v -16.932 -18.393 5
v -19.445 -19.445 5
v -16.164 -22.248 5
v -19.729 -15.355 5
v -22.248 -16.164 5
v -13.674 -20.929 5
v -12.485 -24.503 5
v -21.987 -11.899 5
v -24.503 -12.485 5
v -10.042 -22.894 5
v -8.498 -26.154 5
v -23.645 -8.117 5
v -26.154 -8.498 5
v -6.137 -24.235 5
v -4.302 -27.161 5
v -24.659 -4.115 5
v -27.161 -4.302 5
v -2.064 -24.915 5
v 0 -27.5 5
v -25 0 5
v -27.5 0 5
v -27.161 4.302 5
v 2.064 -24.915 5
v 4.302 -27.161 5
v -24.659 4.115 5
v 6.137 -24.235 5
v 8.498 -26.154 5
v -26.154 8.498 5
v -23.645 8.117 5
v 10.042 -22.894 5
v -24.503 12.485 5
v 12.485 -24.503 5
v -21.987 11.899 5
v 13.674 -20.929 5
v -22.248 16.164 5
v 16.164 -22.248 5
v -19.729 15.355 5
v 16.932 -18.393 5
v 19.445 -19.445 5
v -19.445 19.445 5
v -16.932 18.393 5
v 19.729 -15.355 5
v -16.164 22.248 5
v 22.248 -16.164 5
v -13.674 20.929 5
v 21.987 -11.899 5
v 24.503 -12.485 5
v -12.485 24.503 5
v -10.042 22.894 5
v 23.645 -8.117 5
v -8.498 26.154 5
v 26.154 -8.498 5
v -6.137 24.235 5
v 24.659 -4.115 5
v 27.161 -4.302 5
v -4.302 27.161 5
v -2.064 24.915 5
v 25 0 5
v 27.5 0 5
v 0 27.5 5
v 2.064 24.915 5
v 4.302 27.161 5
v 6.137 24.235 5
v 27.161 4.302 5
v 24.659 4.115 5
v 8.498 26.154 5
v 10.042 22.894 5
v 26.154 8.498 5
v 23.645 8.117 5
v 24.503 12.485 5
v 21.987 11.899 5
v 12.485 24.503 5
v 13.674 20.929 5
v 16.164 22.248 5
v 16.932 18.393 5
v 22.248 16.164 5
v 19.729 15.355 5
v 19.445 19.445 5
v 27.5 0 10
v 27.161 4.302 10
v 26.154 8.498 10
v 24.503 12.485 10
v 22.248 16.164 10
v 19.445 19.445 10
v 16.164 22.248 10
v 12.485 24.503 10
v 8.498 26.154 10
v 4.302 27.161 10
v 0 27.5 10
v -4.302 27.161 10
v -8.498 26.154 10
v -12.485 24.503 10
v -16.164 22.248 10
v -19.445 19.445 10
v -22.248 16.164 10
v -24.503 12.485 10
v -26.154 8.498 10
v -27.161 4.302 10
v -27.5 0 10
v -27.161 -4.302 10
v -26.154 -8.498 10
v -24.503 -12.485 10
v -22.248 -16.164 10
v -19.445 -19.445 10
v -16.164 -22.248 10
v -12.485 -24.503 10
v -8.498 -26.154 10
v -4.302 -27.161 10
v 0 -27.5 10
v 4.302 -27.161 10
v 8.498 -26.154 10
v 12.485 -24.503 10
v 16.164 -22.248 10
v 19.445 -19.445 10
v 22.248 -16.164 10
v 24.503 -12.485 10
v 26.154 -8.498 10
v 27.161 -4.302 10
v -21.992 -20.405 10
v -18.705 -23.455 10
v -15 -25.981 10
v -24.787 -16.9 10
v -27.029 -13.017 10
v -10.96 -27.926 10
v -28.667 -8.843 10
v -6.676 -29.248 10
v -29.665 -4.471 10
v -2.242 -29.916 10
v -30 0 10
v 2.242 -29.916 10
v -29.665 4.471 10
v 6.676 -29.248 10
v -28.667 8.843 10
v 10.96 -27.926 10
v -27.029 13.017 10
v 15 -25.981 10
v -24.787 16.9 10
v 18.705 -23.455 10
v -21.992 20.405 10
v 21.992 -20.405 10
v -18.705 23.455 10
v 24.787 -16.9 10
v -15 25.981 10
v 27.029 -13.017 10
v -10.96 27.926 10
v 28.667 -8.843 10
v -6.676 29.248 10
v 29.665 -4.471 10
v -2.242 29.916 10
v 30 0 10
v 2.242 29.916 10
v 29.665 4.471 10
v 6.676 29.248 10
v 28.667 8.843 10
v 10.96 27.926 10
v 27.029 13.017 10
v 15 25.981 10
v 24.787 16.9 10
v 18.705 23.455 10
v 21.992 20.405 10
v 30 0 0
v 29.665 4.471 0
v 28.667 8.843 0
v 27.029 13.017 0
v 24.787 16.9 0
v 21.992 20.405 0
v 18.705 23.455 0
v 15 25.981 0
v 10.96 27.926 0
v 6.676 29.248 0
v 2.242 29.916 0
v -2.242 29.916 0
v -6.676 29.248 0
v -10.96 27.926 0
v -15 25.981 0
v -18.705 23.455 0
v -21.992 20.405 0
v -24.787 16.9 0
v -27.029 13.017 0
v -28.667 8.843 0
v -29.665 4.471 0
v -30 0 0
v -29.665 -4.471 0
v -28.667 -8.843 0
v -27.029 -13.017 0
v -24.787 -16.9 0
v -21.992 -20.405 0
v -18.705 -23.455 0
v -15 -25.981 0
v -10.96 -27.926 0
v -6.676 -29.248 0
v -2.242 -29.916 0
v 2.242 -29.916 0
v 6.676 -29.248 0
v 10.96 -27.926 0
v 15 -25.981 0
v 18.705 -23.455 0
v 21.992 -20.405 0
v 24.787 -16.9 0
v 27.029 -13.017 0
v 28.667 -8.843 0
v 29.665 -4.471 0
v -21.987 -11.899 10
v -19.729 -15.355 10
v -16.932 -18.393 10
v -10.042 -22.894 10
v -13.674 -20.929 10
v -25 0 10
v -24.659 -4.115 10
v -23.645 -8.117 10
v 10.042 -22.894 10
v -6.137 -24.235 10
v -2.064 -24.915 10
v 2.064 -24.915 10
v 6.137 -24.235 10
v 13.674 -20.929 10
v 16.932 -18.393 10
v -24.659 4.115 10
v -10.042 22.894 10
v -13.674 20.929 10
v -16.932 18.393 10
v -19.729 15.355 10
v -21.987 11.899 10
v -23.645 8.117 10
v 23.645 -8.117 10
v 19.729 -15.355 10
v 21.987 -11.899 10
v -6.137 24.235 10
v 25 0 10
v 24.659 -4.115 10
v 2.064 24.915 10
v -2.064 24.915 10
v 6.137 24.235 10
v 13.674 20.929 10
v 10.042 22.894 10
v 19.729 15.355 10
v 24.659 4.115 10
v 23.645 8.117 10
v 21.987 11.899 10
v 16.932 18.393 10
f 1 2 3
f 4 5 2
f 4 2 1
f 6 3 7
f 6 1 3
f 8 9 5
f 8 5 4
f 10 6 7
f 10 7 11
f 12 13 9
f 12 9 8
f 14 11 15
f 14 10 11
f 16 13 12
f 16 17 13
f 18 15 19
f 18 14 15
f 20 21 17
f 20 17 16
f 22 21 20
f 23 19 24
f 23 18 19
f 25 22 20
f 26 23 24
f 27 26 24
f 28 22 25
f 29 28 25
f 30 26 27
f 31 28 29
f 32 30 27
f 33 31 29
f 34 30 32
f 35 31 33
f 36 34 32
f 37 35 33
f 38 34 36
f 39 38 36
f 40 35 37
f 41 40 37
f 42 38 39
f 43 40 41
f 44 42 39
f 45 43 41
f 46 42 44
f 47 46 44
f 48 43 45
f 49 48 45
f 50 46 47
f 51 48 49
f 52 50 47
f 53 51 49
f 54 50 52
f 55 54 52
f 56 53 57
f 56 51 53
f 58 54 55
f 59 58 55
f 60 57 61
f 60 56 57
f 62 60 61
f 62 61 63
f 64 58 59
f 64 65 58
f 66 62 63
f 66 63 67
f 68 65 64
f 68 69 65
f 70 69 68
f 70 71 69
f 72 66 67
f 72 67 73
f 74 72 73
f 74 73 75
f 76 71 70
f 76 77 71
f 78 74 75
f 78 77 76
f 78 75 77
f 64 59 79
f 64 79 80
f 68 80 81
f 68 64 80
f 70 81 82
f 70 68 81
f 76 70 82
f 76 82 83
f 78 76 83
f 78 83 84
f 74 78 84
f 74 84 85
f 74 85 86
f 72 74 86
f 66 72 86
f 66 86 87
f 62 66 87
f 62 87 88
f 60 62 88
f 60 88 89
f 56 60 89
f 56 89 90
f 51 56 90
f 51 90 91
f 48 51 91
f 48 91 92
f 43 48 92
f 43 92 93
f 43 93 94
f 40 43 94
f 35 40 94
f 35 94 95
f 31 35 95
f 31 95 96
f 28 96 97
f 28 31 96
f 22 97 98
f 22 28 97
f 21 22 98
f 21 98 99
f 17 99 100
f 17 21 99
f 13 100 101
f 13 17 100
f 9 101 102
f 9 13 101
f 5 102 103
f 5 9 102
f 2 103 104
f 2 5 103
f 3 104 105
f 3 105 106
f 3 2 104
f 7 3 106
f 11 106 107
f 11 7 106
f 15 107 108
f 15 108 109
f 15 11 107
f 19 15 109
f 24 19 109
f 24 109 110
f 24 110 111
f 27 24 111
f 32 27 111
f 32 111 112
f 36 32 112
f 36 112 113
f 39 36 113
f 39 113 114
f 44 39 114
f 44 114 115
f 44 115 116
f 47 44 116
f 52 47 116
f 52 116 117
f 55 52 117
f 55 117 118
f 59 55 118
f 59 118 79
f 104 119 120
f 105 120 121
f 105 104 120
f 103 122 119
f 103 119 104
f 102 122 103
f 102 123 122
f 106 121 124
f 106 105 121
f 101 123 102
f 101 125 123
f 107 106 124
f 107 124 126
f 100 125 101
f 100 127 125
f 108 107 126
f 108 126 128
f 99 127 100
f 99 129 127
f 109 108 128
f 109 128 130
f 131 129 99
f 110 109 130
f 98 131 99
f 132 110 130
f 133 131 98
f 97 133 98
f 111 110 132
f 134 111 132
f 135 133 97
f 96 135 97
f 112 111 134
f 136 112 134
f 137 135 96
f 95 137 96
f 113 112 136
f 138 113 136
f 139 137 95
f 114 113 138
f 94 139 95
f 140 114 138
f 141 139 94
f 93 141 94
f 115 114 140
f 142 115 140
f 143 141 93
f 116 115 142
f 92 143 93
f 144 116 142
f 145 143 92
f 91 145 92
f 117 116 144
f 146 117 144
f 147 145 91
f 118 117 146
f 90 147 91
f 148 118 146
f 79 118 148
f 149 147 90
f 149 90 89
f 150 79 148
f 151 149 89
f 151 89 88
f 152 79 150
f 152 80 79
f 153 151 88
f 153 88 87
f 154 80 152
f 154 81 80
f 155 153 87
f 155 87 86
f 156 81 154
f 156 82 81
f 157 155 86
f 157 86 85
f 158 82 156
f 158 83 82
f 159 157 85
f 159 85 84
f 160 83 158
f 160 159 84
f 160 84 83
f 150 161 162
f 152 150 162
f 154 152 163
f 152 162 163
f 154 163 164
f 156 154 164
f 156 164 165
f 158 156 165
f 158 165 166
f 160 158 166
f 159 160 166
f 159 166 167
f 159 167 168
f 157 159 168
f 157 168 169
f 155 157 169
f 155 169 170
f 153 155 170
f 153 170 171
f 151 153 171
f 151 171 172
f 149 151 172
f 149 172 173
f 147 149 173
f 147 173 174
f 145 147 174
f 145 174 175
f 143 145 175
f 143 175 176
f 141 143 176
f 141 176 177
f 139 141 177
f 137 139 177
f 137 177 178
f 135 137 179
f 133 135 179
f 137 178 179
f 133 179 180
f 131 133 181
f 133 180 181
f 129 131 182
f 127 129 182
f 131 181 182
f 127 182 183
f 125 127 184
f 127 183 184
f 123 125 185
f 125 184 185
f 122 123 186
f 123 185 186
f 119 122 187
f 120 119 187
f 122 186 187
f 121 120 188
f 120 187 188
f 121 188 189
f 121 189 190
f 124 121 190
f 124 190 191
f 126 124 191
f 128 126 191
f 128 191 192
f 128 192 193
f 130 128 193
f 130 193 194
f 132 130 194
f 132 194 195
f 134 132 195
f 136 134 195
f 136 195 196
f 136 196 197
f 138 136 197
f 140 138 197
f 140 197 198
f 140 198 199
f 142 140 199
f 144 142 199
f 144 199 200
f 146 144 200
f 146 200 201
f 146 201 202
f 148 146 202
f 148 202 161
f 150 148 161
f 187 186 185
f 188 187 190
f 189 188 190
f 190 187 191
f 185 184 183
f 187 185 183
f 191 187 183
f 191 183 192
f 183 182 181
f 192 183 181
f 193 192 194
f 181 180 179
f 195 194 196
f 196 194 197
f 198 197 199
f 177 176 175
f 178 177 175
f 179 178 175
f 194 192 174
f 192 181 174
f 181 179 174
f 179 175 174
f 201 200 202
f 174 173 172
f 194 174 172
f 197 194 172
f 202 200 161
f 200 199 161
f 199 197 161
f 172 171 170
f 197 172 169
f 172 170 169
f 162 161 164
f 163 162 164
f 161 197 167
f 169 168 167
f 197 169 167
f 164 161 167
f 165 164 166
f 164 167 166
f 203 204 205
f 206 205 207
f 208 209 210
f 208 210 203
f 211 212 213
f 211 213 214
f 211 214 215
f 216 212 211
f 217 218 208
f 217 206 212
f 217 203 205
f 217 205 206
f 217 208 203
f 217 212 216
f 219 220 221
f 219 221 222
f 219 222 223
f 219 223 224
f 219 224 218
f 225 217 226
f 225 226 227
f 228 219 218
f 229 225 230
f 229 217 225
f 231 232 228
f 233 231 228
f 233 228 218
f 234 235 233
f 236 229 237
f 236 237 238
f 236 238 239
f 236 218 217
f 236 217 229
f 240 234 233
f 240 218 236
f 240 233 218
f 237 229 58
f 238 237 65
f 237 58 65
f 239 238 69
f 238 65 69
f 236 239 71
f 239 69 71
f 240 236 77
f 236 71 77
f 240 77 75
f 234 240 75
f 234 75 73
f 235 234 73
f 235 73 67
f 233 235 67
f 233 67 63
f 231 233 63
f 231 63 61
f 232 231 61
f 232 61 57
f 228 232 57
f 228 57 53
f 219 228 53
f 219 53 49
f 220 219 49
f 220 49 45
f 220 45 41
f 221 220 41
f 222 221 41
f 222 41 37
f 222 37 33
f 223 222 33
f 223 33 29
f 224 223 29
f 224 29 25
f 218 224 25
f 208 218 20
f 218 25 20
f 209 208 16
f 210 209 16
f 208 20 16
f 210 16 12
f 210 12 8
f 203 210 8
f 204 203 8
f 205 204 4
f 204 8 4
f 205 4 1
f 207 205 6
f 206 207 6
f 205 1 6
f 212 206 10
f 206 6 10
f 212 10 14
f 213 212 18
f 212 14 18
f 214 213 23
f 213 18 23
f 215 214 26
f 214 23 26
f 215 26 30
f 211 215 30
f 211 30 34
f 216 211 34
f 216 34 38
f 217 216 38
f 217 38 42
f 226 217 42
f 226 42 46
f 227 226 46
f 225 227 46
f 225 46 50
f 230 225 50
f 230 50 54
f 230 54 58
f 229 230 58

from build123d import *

# Parameters (mm, degrees)
F0_R      = 30
F0_R_2    = 27.5
F1_DEPTH  = 5
F2_DEPTH  = 10
F3_DEPTH  = 7.5
F4_R      = 30
F5_DEPTH  = 5
F6_R      = 30
F6_R_2    = 27.5
F7_DEPTH  = 2.5
F8_R      = 17.5
F9_DEPTH  = 3
F10_R     = 25
F11_DEPTH = 10


# Not quite as in the source:
# - a feature names something its author has since deleted; it is built from what else it names


with BuildPart() as f1:
    # F0 (on Top) → F1 (new body)
    with BuildSketch(Plane.XY):
        Circle(F0_R)
        Circle(F0_R_2, mode=Mode.SUBTRACT)
    extrude(amount=F1_DEPTH)

    # F0 (on Top) → F2 (join)
    with BuildSketch(Plane.XY):
        Circle(F0_R)
        Circle(F0_R_2, mode=Mode.SUBTRACT)
    extrude(amount=F2_DEPTH)

    # F0 (on Top) → F3 (join)
    with BuildSketch(Plane.XY):
        Circle(F0_R)
        Circle(F0_R_2, mode=Mode.SUBTRACT)
    extrude(amount=F3_DEPTH)

    # F4 (on Top) → F5 (join)
    with BuildSketch(Plane.XY):
        Circle(F4_R)
    extrude(amount=F5_DEPTH)

    # F6 (on Top) → F7 (join)
    with BuildSketch(Plane.XY):
        Circle(F6_R)
        Circle(F6_R_2, mode=Mode.SUBTRACT)
    extrude(amount=F7_DEPTH)

    # F8 (on Top) → F9 (join)
    with BuildSketch(Plane.XY):
        Circle(F8_R)
    extrude(amount=F9_DEPTH)

    # F10 (on Top) → F11 (join)
    with BuildSketch(Plane.XY):
        Circle(F10_R)
    extrude(amount=F11_DEPTH)


solid = f1.part
